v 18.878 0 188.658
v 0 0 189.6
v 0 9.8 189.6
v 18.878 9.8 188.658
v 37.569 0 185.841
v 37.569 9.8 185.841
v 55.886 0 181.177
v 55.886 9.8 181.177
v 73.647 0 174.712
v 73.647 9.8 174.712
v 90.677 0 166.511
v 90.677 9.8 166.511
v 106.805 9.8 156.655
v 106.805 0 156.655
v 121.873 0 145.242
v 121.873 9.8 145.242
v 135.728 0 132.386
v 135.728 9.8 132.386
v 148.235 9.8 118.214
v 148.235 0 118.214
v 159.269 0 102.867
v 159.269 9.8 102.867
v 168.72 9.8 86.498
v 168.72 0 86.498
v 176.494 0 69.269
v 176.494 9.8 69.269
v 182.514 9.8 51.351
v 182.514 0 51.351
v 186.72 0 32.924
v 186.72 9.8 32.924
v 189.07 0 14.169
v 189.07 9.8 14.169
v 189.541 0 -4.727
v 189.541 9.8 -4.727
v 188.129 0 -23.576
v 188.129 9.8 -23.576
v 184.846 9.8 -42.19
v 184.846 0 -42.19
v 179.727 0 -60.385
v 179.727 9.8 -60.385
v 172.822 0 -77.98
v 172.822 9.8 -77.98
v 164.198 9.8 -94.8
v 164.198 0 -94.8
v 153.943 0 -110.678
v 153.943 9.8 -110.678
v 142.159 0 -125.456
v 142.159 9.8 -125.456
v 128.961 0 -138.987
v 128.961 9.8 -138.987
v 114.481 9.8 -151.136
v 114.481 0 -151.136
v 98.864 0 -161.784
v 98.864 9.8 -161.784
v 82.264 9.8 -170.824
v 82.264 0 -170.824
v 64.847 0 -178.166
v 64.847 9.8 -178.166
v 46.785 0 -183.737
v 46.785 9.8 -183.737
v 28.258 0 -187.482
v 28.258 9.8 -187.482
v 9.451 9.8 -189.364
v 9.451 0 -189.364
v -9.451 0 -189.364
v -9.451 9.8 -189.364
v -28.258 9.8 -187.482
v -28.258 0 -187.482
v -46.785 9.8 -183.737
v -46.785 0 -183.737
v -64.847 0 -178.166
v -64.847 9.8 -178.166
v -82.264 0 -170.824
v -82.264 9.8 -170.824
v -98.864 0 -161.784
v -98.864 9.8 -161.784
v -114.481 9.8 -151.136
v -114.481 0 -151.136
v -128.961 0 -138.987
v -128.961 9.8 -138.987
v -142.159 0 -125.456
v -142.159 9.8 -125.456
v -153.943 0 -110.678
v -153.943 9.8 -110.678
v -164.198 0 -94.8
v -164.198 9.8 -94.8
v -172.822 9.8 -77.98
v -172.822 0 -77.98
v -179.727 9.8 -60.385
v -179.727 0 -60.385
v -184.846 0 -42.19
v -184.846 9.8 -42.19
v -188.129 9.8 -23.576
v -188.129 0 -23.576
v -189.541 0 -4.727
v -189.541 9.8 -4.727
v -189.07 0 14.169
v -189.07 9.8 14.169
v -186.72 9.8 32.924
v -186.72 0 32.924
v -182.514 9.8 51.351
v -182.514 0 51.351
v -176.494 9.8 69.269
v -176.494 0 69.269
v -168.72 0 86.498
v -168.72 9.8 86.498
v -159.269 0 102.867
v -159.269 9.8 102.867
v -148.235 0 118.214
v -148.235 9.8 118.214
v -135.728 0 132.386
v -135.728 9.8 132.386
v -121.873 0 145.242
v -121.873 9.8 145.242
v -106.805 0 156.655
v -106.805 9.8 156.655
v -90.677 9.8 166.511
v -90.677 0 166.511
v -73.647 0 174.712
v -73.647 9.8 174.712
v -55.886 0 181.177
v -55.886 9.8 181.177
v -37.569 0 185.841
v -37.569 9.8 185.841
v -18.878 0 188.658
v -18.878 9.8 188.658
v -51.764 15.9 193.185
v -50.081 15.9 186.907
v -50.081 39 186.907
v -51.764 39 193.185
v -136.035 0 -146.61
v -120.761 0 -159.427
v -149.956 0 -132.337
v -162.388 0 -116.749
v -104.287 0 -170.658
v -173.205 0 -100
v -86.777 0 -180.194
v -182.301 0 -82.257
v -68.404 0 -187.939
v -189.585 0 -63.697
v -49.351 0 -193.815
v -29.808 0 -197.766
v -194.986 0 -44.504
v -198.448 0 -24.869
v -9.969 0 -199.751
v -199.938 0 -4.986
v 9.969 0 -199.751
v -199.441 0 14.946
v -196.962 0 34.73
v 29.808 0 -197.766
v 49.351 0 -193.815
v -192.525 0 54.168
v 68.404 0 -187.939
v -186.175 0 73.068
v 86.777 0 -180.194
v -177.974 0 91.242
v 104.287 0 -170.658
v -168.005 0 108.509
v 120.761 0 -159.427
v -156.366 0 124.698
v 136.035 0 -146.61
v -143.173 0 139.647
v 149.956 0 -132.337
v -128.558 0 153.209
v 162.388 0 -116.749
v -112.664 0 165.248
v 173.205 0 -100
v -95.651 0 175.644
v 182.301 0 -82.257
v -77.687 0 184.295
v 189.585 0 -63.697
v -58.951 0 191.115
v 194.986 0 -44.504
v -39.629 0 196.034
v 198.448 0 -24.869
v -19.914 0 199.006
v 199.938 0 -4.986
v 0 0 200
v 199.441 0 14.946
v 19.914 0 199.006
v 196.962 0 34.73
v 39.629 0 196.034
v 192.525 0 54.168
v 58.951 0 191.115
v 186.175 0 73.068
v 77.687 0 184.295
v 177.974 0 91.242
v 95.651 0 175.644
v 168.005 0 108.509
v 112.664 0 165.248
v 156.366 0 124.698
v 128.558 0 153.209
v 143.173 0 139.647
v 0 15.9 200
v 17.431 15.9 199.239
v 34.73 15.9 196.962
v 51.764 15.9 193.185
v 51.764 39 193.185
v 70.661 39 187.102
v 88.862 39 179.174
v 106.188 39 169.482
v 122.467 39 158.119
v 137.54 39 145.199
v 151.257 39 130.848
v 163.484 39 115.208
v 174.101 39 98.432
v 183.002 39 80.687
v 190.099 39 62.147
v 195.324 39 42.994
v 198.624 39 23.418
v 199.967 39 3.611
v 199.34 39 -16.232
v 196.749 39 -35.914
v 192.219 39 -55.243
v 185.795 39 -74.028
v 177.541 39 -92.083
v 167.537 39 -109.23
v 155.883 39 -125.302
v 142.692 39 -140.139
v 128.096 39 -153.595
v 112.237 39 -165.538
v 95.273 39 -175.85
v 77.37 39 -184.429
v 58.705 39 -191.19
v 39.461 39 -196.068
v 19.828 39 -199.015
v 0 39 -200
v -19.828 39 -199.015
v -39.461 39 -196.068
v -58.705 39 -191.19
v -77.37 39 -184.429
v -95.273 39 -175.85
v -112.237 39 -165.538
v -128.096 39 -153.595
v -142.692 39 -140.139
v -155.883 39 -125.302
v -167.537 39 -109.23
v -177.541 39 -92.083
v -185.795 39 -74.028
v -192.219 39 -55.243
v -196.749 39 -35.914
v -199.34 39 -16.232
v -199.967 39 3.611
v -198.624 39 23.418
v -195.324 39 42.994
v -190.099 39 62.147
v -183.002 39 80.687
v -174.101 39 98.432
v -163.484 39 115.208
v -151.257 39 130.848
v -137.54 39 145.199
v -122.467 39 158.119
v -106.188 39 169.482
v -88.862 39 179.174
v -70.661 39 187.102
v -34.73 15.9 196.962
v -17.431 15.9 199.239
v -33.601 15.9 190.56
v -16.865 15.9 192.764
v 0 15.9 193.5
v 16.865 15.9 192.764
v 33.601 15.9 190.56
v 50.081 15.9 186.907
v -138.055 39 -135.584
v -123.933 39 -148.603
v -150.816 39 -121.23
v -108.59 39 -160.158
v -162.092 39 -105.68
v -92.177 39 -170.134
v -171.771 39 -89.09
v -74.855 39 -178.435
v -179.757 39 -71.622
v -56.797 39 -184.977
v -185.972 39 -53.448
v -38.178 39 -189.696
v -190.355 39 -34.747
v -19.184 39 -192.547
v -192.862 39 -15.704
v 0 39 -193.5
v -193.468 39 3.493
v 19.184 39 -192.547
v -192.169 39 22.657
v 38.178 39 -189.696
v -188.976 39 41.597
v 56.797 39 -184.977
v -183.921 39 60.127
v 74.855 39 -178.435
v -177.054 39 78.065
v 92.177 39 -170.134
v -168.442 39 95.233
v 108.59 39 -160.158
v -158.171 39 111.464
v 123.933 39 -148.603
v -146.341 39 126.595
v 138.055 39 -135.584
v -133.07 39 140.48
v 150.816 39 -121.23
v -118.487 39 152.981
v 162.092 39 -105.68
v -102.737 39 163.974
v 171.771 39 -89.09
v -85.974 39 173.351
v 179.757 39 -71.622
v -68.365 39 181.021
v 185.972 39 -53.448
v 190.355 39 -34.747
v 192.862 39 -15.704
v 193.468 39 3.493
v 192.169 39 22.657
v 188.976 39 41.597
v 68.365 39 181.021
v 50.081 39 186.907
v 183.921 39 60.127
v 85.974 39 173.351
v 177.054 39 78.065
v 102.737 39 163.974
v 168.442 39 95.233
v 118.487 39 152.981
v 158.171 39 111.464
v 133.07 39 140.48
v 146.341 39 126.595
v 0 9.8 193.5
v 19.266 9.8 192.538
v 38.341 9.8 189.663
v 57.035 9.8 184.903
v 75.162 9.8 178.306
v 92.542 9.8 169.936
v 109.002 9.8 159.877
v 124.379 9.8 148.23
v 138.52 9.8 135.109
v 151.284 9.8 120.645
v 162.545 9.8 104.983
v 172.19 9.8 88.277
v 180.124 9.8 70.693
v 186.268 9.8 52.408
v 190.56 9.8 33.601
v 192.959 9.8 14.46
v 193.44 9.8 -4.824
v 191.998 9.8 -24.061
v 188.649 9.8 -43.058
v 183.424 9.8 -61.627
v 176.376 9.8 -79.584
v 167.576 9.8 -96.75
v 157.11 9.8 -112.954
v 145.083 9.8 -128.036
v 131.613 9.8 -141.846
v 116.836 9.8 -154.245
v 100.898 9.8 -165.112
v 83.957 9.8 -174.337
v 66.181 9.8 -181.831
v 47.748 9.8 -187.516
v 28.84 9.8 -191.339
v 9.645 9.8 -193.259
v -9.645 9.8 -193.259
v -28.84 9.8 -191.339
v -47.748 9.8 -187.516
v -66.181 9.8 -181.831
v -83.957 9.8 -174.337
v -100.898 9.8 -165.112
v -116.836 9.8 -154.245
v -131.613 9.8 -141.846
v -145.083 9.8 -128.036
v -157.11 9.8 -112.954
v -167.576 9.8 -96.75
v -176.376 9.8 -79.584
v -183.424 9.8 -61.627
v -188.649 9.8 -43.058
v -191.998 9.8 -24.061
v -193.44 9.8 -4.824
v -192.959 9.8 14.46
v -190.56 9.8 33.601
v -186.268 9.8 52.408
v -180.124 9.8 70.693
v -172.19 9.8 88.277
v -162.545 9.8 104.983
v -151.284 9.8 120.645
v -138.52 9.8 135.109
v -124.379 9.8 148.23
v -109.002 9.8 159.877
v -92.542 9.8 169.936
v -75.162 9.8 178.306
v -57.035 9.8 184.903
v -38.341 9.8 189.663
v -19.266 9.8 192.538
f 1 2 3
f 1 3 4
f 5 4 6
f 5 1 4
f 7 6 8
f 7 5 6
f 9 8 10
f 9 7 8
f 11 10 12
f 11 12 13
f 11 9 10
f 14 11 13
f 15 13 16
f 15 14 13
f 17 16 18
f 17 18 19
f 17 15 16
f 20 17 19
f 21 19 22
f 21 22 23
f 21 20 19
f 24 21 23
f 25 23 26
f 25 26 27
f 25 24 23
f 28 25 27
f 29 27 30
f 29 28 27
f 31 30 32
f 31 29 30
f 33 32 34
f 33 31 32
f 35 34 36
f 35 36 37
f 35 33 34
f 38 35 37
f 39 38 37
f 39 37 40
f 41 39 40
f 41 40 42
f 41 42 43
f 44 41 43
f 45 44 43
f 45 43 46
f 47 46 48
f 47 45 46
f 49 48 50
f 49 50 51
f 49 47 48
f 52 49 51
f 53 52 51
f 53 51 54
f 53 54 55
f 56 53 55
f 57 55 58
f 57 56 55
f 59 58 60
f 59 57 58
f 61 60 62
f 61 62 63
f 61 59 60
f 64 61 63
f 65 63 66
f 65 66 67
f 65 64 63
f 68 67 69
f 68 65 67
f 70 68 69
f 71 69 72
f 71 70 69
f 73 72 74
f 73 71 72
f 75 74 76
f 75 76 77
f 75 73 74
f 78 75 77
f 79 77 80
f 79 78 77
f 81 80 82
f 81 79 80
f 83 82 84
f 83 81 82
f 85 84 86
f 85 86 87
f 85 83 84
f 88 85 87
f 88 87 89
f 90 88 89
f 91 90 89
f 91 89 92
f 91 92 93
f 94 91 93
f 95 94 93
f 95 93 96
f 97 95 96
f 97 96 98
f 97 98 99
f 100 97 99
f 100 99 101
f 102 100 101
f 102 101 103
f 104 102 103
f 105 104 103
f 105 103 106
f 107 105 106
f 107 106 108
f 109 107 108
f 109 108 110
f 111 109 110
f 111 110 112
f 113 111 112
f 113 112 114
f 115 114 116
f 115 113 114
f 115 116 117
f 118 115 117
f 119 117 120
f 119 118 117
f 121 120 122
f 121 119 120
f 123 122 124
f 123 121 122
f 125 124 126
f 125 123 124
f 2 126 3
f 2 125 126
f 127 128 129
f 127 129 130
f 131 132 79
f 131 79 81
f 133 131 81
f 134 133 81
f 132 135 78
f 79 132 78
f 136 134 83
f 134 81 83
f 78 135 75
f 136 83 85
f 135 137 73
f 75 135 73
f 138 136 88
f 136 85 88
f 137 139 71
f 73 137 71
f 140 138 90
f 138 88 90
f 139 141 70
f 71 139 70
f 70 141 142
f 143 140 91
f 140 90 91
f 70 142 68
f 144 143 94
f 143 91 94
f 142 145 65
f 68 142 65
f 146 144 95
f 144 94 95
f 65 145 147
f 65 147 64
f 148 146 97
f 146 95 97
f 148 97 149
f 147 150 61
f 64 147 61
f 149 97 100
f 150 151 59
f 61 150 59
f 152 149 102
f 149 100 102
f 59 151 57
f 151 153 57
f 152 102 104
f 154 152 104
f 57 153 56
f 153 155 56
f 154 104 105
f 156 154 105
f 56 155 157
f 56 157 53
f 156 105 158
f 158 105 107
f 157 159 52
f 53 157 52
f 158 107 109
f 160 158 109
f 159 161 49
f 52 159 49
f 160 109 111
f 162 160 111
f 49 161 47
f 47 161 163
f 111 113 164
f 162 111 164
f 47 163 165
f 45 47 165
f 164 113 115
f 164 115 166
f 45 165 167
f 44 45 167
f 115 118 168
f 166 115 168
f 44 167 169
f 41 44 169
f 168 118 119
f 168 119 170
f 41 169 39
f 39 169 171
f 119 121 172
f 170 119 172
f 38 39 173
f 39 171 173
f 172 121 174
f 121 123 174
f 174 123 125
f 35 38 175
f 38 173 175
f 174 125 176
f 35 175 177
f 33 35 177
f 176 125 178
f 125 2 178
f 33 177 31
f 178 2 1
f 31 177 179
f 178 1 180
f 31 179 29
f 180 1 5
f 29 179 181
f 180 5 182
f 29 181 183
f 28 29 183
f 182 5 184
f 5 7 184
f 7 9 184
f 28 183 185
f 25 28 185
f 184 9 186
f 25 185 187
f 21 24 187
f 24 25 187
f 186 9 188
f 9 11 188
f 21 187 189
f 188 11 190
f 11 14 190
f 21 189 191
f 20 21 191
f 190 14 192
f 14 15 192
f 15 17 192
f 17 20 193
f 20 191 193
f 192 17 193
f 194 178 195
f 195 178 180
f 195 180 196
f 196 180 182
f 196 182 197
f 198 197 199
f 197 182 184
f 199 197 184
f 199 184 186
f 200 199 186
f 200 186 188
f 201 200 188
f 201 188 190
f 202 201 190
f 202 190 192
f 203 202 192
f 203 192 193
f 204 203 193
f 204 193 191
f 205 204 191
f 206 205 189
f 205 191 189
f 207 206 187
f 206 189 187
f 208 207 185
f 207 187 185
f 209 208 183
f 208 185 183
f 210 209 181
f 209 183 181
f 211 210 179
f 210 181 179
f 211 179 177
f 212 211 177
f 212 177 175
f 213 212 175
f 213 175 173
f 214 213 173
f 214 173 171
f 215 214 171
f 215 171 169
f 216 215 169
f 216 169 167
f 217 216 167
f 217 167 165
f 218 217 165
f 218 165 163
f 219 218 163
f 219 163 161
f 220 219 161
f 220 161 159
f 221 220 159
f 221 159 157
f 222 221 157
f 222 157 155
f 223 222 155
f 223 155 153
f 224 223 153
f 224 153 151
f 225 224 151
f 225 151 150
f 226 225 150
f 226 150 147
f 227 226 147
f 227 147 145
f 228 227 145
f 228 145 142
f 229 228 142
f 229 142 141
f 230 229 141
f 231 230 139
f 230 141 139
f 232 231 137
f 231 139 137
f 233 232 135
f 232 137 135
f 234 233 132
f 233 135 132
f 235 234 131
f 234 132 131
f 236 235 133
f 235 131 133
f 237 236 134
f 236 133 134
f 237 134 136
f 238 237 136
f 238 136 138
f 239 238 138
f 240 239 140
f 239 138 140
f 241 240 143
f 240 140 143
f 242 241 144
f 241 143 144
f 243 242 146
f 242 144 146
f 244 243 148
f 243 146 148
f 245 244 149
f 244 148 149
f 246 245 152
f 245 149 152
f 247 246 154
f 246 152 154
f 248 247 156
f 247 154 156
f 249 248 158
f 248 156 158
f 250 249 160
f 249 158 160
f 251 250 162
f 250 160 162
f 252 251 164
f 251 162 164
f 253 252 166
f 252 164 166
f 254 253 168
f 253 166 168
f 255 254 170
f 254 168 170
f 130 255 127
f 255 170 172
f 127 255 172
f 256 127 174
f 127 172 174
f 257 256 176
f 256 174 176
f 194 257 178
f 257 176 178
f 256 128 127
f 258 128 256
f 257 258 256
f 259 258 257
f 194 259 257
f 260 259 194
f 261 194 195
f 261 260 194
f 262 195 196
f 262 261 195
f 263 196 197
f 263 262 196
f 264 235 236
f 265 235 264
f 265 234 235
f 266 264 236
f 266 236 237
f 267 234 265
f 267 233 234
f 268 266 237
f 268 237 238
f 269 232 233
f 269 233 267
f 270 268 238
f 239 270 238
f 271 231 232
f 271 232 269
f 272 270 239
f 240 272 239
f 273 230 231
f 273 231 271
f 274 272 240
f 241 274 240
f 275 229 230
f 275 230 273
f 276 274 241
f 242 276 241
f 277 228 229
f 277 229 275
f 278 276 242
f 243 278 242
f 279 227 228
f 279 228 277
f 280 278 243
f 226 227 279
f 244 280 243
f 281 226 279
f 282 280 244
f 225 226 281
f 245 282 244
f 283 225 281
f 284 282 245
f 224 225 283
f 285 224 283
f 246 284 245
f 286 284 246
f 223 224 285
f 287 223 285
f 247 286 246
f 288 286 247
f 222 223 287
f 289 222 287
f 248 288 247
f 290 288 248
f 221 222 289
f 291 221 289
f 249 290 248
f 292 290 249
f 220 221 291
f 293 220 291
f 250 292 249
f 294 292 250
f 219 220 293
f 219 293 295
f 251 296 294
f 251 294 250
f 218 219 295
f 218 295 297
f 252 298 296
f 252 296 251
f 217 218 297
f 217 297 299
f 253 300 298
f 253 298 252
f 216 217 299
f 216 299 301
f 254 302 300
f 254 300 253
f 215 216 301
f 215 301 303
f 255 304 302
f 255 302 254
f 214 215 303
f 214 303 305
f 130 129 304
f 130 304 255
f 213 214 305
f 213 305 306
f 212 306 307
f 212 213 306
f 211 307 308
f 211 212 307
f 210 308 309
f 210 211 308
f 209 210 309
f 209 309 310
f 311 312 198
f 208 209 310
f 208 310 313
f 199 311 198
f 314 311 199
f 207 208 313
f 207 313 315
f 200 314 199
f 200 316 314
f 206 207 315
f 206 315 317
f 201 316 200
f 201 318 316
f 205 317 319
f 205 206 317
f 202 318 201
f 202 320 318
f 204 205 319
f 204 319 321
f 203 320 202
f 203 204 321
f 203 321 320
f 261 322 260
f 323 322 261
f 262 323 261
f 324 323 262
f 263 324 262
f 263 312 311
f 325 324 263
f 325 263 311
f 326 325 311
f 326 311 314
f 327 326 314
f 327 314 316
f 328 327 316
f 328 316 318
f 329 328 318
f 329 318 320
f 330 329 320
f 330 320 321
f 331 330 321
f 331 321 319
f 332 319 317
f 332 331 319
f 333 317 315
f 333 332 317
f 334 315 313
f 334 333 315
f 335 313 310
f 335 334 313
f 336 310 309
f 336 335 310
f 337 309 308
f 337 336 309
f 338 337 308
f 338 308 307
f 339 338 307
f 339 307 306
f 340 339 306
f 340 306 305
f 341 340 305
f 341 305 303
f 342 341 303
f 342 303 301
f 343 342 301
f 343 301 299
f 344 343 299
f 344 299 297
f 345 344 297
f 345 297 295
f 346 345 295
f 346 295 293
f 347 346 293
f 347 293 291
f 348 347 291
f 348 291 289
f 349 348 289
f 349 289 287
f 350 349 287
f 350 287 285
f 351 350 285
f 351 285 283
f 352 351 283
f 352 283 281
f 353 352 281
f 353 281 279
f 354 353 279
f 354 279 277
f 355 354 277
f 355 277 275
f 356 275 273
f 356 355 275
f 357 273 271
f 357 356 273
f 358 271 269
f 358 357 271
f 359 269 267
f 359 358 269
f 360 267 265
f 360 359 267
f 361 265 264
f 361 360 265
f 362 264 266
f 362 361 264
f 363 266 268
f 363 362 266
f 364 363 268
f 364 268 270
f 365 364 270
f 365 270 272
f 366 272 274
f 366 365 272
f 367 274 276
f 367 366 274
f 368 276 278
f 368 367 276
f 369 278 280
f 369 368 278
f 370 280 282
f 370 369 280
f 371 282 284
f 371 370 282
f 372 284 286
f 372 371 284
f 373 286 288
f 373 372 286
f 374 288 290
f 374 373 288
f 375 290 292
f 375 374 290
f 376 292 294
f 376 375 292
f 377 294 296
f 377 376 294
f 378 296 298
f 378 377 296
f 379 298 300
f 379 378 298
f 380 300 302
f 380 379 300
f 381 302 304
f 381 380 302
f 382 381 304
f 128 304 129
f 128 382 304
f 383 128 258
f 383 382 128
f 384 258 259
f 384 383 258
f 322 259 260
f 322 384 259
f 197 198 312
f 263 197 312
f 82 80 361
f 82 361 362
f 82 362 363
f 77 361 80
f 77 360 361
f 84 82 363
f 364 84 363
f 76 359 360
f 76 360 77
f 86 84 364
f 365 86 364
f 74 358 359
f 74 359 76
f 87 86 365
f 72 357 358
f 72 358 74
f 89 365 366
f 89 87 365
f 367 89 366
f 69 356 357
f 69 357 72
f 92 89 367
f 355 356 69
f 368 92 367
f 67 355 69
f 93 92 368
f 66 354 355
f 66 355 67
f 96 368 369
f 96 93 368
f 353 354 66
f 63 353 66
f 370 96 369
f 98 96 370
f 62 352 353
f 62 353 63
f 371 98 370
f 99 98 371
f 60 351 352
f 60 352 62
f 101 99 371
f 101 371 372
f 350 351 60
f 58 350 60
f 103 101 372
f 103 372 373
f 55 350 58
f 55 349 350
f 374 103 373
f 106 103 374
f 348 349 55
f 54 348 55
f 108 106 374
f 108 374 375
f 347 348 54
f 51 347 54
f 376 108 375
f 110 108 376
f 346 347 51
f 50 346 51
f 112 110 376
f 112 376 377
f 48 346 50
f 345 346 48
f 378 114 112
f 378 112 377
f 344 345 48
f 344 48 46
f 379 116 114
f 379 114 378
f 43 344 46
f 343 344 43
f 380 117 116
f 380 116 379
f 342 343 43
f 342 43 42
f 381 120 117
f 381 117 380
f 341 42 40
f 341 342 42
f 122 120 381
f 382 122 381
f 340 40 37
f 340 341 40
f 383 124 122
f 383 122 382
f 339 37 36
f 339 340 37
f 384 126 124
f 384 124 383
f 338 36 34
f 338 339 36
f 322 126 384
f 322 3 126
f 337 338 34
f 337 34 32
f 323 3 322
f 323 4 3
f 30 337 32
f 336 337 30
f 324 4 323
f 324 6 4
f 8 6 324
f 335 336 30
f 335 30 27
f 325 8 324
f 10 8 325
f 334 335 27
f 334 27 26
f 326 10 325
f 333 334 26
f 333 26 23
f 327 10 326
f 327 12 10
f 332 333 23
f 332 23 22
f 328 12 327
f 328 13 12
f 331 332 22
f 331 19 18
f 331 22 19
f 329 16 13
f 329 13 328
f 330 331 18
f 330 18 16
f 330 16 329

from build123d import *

# Parameters (mm, degrees)
SKETCH_1_R          = 200
SKETCH_1_R_2        = 193.5
EXTRUDE_1_DEPTH     = 39
SKETCH_1_5_R        = 193.5
SKETCH_1_5_R_2      = 189.6
EXTRUDE_2_DEPTH     = 9.8
CUT_EXTRUDE_START   = -23.1
CUT_EXTRUDE_1_DEPTH = 23.1


with BuildPart() as part:
    # 草图1 → 凸台-拉伸1 (new body)
    with BuildSketch(Plane(origin=(0, 0, 0), x_dir=(1, 0, 0), z_dir=(0, 1, 0))):
        with Locations(Location((0, 0, 0), (0, 0, 270))):
            Circle(SKETCH_1_R)
        with Locations(Location((0, 0, 0), (0, 0, 270))):
            Circle(SKETCH_1_R_2, mode=Mode.SUBTRACT)
    extrude(amount=EXTRUDE_1_DEPTH)

    # 草图1<5> → 凸台-拉伸2 (add)
    with BuildSketch(Plane(origin=(0, 0, 0), x_dir=(1, 0, 0), z_dir=(0, 1, 0))):
        with Locations(Location((0, 0, 0), (0, 0, 270))):
            Circle(SKETCH_1_5_R)
        with Locations(Location((0, 0, 0), (0, 0, 270))):
            Circle(SKETCH_1_5_R_2, mode=Mode.SUBTRACT)
    extrude(amount=EXTRUDE_2_DEPTH)

    # 草图4 → 切除-拉伸1 (cut)
    with BuildSketch(Plane(origin=(0, 39, 0), x_dir=(1, 0, 0), z_dir=(0, 1, 0)).offset(CUT_EXTRUDE_START)):
        with BuildLine():
            Line((-50.081485227, -186.906647387), (-51.763809021, -193.185165258))
            ThreePointArc((-51.763809021, -193.185165258), (0, -200), (51.763809021, -193.185165258))
            Line((51.763809021, -193.185165258), (50.081485227, -186.906647387))
            ThreePointArc((50.081485227, -186.906647387), (0, -193.5), (-50.081485227, -186.906647387))
        make_face()
    extrude(amount=CUT_EXTRUDE_1_DEPTH, mode=Mode.SUBTRACT)


solid = part.part
